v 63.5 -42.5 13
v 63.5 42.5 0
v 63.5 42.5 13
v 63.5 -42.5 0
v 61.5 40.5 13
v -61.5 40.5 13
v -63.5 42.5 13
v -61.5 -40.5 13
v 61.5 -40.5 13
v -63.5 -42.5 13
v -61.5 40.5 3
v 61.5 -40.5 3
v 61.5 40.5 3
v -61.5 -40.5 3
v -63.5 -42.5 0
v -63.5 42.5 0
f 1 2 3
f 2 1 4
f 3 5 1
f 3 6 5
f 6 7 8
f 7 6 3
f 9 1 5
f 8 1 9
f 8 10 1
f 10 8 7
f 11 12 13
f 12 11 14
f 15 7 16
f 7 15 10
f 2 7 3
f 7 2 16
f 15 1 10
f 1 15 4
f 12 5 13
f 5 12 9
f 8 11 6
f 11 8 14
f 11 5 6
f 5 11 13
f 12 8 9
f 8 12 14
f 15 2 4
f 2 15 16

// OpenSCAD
// Pipette rack tray. Origin at the corner-centered footprint, base bottom at z=0.
// Assumption: wall stands on top of the 3 mm base (total height 13 mm).
base_t = 3;
wall_t = 2;
wall_h = 10;
in_x = 123;
in_y = 81;
out_x = in_x + 2*wall_t; // 127
out_y = in_y + 2*wall_t; // 85

union() {
    translate([-out_x/2, -out_y/2, 0]) cube([out_x, out_y, base_t]);
    translate([0, 0, base_t])
        difference() {
            translate([-out_x/2, -out_y/2, 0]) cube([out_x, out_y, wall_h]);
            translate([-in_x/2, -in_y/2, -0.01]) cube([in_x, in_y, wall_h + 0.02]);
        }
}
